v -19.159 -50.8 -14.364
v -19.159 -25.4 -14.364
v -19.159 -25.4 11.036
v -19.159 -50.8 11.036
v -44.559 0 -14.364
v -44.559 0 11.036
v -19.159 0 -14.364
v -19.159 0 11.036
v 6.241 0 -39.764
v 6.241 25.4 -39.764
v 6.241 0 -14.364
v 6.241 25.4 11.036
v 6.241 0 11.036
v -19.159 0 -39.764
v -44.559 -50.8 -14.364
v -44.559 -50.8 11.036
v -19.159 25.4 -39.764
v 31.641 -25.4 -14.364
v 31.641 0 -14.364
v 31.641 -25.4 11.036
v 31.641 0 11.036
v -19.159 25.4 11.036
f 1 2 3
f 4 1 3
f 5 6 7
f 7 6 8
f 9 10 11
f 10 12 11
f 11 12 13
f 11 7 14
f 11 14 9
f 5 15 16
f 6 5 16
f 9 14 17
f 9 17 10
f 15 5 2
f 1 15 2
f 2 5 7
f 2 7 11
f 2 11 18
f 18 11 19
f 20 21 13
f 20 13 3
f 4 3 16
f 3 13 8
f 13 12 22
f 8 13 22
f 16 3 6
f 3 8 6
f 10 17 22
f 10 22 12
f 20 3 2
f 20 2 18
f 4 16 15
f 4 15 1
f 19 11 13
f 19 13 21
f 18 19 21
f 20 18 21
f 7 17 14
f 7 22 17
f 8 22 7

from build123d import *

# Parameters (mm, degrees)
F0_W     = 25.4
F0_H     = 25.4
F1_DEPTH = 50.8
F2_DEPTH = 25.4
F3_W     = 25.4
F3_H     = 25.4
F4_DEPTH = 25.4
F5_W     = 25.4
F5_H     = 25.4
F6_DEPTH = 25.4


with BuildPart() as f1:
    # F0 (on Front) → F1 (new body)
    with BuildSketch(Plane.XZ):
        with Locations((-31.858784, -1.663636)):
            Rectangle(F0_W, F0_H)
    extrude(amount=F1_DEPTH)

    # F0 (on Front) → F2 (join)
    with BuildSketch(Plane.XZ):
        with Locations((18.941216, -1.663636)):
            Rectangle(F0_W, F0_H)
        with Locations((-6.458784, -1.663636)):
            Rectangle(F0_W, F0_H)
    extrude(amount=F2_DEPTH)

    # F3 (on face) → F4 (join)
    with BuildSketch(Plane.XZ):
        with Locations((-6.458784, -1.663636)):
            Rectangle(F3_W, F3_H)
    extrude(amount=-F4_DEPTH)

    # F5 (on face) → F6 (join)
    with BuildSketch(Plane(origin=(0, 0, -14.363636), x_dir=(1, 0, 0), z_dir=(0, 0, -1))):
        with Locations((-6.458784, -12.7)):
            Rectangle(F5_W, F5_H)
    extrude(amount=F6_DEPTH)


solid = f1.part
